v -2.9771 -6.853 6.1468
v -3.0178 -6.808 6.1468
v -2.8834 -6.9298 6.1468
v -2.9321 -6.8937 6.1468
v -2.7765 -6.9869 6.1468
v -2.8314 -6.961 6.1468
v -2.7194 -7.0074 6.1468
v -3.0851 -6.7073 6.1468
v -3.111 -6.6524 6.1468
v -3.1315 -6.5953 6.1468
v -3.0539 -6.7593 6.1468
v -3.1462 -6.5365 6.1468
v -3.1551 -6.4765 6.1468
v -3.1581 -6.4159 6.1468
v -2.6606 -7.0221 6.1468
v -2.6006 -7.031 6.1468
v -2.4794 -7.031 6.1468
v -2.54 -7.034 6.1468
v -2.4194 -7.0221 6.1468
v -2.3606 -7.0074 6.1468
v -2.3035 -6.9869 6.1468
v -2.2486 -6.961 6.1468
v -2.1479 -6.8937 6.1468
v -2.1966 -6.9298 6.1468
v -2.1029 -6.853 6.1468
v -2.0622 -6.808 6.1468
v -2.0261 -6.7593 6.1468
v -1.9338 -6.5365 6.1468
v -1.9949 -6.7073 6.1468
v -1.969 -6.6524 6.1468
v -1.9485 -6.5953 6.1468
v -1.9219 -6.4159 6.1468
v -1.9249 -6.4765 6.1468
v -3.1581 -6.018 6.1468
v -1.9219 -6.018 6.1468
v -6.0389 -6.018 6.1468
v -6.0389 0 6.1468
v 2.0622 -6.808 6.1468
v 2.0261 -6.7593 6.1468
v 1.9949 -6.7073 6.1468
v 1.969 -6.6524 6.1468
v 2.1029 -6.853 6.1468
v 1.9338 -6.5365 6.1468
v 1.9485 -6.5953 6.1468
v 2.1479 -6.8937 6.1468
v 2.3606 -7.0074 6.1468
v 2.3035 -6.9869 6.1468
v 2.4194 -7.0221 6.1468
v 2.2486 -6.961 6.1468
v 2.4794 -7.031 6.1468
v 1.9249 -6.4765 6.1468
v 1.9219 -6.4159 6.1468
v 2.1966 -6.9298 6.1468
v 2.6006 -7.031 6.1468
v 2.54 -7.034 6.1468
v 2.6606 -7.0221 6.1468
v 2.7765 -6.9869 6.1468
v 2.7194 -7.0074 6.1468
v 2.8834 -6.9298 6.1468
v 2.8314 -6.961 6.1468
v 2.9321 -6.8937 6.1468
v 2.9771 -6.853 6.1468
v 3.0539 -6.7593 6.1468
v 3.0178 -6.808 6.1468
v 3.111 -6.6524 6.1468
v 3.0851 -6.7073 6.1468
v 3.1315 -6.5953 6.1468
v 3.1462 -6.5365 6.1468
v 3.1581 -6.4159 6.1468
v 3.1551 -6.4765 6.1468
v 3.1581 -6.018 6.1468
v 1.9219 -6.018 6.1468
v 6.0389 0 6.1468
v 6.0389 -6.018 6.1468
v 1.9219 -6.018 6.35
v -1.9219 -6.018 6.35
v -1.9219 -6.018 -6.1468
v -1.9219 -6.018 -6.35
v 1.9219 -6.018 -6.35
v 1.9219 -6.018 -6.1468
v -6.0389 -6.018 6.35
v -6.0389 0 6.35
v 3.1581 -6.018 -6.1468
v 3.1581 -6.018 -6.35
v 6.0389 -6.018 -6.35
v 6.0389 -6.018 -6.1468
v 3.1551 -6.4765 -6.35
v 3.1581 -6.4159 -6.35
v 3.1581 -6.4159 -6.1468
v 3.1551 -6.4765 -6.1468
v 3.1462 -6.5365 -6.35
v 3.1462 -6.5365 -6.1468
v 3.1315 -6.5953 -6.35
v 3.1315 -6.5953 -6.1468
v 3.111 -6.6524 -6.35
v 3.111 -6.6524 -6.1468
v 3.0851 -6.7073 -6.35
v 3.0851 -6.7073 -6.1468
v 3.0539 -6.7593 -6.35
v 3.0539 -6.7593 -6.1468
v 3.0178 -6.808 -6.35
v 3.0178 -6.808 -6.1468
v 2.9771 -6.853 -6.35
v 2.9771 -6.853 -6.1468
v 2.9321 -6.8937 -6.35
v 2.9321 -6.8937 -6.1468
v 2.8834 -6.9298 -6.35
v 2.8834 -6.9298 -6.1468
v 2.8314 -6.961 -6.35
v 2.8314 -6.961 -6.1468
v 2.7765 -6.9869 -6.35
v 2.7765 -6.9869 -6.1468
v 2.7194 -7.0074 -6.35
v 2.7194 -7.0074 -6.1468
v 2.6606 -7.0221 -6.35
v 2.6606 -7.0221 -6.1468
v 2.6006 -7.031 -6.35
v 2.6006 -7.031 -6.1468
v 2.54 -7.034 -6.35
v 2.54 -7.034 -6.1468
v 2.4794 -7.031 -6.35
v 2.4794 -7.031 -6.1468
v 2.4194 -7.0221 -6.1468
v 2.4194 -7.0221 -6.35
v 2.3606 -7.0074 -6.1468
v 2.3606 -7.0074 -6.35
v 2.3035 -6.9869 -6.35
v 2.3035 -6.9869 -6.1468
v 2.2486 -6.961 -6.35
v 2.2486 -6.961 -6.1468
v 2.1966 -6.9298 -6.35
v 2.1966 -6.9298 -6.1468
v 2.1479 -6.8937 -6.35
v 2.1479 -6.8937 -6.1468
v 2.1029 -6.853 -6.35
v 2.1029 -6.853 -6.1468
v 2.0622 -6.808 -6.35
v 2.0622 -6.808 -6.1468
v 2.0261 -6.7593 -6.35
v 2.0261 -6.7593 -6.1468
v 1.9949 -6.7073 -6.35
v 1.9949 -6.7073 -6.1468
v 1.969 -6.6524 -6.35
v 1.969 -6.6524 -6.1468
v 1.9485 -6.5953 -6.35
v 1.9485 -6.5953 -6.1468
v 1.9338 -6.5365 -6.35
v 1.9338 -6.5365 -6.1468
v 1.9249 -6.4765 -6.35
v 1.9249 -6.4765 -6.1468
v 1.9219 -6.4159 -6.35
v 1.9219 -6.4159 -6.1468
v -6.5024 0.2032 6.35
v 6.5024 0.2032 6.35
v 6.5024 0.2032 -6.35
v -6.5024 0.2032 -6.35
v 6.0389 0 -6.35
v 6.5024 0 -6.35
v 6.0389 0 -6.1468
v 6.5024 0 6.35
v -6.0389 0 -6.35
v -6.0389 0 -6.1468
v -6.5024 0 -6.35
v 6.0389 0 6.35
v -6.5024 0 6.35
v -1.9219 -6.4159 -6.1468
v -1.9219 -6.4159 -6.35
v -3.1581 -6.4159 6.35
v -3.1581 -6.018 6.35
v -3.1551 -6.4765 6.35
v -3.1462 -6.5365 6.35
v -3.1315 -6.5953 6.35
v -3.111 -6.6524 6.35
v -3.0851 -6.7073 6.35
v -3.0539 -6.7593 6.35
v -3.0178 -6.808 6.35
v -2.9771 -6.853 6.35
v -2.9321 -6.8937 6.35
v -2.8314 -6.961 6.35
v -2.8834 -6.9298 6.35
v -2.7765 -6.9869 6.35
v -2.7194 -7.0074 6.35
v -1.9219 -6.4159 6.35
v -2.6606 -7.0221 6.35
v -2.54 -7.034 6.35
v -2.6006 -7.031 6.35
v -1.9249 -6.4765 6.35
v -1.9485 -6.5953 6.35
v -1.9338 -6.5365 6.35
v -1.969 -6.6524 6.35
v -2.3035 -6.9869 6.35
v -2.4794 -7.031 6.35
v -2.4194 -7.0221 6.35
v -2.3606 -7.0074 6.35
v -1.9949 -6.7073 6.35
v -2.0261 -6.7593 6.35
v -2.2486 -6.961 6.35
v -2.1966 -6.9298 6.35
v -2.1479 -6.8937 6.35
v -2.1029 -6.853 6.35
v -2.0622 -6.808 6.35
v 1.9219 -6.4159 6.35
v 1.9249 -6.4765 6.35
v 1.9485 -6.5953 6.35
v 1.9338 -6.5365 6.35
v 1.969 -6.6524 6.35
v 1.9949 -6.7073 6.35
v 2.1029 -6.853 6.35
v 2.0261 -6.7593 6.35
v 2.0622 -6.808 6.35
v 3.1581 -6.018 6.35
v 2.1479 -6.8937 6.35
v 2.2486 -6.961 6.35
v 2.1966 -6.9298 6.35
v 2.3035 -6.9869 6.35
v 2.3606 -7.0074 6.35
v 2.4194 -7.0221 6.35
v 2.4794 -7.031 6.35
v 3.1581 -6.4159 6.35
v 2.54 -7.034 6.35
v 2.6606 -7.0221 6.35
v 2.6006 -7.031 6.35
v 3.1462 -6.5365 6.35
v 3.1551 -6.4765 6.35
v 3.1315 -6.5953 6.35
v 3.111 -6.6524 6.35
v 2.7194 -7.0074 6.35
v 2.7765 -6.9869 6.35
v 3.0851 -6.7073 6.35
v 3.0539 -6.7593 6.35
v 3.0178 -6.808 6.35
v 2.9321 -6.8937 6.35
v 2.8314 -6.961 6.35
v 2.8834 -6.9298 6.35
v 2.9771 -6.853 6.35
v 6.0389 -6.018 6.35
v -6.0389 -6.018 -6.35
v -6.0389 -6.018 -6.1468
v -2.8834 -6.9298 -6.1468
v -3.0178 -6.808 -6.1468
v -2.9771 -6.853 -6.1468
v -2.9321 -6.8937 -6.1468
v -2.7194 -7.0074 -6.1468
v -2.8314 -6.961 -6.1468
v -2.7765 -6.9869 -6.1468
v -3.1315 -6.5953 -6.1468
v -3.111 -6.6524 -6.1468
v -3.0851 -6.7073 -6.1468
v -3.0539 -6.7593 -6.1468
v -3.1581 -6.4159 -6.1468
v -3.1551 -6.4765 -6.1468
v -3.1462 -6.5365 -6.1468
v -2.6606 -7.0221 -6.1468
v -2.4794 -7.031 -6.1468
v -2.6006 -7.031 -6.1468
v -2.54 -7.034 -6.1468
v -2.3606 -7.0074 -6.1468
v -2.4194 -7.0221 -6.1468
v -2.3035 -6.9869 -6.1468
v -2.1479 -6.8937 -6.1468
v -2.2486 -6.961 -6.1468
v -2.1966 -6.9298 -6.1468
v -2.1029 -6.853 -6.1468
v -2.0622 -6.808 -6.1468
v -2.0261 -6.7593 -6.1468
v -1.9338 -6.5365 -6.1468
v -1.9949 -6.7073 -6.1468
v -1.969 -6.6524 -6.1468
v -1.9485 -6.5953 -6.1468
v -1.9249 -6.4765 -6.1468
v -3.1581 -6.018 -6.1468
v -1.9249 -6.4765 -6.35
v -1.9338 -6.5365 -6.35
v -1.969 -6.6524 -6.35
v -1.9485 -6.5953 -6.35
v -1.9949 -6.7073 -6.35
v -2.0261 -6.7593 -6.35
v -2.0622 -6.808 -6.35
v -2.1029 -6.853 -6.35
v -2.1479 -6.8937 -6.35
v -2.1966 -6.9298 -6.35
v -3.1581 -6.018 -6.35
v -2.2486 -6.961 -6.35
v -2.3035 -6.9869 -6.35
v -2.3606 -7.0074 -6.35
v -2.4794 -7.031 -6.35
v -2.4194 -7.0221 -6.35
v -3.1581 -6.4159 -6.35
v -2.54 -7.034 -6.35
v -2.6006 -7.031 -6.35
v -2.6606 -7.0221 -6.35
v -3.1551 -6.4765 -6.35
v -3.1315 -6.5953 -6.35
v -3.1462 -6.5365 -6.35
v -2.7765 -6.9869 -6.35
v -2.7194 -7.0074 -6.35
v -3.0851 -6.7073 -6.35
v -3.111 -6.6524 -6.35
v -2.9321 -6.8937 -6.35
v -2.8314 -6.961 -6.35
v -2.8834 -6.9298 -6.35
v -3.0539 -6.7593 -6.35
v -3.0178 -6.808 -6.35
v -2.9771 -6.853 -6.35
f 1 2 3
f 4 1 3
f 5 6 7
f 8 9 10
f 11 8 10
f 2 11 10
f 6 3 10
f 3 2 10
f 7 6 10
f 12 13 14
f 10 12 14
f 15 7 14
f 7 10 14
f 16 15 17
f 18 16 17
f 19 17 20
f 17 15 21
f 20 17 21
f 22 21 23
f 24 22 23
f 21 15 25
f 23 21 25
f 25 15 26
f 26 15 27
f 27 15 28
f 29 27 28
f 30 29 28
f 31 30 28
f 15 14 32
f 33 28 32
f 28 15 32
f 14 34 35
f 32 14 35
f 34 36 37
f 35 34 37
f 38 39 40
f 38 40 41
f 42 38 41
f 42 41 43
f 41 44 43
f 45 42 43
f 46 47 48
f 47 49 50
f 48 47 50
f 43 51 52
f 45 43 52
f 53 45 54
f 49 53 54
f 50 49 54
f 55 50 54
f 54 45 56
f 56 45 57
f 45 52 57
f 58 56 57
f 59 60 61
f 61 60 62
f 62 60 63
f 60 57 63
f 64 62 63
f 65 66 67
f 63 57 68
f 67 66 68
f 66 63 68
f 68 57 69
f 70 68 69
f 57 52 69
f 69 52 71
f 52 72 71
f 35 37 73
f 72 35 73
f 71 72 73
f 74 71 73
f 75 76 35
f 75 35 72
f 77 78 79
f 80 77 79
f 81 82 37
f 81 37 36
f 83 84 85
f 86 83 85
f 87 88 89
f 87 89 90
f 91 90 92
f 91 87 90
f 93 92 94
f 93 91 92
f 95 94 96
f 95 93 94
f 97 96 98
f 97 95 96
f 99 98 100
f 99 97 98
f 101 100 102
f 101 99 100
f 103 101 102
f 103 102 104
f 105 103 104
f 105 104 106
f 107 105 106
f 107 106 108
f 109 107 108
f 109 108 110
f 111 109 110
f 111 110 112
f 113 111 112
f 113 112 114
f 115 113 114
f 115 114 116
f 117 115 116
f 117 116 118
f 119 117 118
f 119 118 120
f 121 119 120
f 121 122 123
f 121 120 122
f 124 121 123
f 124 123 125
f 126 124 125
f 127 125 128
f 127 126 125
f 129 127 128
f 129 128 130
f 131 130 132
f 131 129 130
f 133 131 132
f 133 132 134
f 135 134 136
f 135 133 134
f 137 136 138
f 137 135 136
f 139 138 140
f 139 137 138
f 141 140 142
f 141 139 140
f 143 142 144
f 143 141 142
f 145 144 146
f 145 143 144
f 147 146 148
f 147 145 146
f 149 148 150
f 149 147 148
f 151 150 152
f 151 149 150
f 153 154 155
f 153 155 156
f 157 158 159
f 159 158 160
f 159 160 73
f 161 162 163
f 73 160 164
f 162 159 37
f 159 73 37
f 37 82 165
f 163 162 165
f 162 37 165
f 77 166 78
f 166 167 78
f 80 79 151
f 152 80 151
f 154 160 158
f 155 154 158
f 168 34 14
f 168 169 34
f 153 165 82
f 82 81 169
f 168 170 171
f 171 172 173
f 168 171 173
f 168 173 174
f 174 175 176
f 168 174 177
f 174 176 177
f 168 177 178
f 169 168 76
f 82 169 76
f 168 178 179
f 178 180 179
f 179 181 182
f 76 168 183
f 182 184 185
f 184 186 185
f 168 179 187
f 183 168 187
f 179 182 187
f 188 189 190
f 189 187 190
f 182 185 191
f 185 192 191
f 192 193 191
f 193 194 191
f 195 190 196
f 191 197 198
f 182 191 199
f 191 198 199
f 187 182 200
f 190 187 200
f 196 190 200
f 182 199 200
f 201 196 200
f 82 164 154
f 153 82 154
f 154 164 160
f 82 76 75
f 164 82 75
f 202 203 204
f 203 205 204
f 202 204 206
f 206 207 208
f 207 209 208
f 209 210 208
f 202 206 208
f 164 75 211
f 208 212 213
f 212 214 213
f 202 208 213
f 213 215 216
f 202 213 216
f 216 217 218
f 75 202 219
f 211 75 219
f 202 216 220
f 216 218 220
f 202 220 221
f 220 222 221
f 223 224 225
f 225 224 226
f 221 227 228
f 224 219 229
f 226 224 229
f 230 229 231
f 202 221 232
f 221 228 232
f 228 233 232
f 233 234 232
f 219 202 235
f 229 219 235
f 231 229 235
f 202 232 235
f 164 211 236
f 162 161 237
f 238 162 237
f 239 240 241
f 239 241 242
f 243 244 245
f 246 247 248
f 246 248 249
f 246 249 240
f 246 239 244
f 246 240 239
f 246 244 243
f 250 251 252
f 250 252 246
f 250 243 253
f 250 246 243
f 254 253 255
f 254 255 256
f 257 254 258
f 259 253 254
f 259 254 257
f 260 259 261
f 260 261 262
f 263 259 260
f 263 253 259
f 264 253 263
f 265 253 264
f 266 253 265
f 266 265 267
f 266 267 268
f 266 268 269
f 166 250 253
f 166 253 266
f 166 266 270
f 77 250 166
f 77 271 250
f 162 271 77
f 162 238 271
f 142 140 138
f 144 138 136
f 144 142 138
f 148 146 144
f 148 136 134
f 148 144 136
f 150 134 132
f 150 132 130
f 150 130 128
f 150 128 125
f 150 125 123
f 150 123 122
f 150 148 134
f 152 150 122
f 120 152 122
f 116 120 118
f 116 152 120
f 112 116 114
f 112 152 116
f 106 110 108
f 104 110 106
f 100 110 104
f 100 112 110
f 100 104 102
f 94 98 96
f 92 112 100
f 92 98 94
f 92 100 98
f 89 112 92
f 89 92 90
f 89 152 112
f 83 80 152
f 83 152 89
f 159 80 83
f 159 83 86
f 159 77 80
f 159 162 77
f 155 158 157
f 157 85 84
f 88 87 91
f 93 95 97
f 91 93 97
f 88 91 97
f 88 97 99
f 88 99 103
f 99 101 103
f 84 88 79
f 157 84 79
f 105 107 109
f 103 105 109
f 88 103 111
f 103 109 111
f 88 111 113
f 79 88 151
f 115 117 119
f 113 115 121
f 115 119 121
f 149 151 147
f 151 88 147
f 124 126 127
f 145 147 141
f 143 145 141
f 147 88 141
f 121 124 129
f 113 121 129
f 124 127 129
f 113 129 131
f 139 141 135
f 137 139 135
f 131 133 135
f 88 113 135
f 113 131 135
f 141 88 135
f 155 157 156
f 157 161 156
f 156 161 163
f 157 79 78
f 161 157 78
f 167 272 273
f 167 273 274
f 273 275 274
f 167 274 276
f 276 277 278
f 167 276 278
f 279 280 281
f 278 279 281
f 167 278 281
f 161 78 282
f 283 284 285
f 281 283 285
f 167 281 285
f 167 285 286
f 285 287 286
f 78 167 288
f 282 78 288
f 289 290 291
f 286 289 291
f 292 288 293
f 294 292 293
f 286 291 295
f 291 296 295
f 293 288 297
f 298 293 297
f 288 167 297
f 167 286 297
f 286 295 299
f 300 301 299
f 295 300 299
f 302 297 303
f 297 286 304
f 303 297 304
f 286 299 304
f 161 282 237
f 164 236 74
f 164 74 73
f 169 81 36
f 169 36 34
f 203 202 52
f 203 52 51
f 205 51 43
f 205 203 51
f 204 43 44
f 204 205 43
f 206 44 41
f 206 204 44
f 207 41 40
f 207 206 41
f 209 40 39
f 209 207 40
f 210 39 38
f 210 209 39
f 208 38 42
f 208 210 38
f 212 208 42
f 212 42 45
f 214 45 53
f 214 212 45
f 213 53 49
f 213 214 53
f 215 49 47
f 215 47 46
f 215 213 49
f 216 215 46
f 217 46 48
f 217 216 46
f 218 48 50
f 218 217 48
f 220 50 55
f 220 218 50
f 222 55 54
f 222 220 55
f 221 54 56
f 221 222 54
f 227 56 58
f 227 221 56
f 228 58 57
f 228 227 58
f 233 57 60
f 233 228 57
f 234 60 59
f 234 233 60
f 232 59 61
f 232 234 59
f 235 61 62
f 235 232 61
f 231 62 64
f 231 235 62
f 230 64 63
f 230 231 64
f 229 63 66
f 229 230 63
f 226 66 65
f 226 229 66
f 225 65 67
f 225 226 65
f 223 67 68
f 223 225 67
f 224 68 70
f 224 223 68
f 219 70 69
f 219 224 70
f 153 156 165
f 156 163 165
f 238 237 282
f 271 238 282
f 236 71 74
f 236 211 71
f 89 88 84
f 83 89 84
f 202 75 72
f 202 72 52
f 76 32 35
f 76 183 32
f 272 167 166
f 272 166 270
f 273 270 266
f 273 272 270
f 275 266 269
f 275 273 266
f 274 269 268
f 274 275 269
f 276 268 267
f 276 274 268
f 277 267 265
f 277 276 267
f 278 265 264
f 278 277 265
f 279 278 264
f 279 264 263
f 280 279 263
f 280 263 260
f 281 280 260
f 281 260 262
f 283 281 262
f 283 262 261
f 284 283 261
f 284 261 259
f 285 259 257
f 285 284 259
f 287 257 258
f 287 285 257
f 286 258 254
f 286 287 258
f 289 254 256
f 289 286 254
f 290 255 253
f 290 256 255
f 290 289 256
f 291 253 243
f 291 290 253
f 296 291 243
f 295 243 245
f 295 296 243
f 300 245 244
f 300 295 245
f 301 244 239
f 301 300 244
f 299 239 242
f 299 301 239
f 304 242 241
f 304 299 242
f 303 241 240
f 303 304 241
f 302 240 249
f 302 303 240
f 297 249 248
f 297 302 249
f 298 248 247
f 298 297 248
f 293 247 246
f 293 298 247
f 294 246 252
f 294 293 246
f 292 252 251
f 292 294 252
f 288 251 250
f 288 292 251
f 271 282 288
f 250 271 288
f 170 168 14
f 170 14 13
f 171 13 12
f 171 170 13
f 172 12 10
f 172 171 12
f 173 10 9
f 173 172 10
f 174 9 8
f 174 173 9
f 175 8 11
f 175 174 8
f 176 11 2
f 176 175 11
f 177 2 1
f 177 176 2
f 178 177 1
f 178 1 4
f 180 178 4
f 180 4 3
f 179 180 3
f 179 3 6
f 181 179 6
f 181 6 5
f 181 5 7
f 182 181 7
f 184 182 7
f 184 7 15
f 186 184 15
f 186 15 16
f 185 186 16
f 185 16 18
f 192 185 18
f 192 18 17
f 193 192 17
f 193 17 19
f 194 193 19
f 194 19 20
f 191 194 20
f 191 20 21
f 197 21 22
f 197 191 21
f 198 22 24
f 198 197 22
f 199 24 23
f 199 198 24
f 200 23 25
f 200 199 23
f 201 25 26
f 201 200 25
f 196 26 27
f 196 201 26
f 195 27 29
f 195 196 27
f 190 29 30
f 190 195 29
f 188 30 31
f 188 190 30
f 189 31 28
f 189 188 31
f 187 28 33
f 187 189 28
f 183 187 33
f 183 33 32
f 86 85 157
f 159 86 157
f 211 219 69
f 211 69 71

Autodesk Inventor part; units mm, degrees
sketch "Sketch_1" plane through (0, 0, 0) normal (0, 1, 0) x (-1, 0, 0)
  line L0 (6.5024, 6.35) -> (-6.5024, 6.35)
  line L1 (-6.5024, 6.35) -> (-6.5024, -6.35)
  line L2 (-6.5024, -6.35) -> (6.5024, -6.35)
  line L3 (6.5024, -6.35) -> (6.5024, 6.35)
extrude "Extrusion1" add sketch "Sketch_1" along normal blind 0.2032
sketch "Sketch_2" plane through (0, 0, -6.35) normal (0, 0, 1) x (1, 0, 0)
  line L0 (-6.0389, -6.018) -> (-3.1581, -6.018)
  line L1 (-3.1581, -6.018) -> (-3.1581, -6.4159)
  arc A0 (-3.1581, -6.4159) -> (-1.9219, -6.4159) centre (-2.54, -6.4159) ccw
  line L2 (-1.9219, -6.4159) -> (-1.9219, -6.018)
  line L3 (-1.9219, -6.018) -> (1.9219, -6.018)
  line L4 (1.9219, -6.018) -> (1.9219, -6.4159)
  arc A1 (1.9219, -6.4159) -> (3.1581, -6.4159) centre (2.54, -6.4159) ccw
  line L5 (3.1581, -6.4159) -> (3.1581, -6.018)
  line L6 (3.1581, -6.018) -> (6.0389, -6.018)
  line L7 (6.0389, -6.018) -> (6.0389, 0)
  line L8 (6.0389, 0) -> (-6.0389, 0)
  line L9 (-6.0389, 0) -> (-6.0389, -6.018)
extrude "Extrusion2" add sketch "Sketch_2" along normal blind 0.2032
sketch "Sketch_3" plane through (0, 0, 6.35) normal (0, 0, 1) x (1, 0, 0)
  line L0 (-6.0389, -6.018) -> (-3.1581, -6.018)
  line L1 (-3.1581, -6.018) -> (-3.1581, -6.4159)
  arc A0 (-3.1581, -6.4159) -> (-1.9219, -6.4159) centre (-2.54, -6.4159) ccw
  line L2 (-1.9219, -6.4159) -> (-1.9219, -6.018)
  line L3 (-1.9219, -6.018) -> (1.9219, -6.018)
  line L4 (1.9219, -6.018) -> (1.9219, -6.4159)
  arc A1 (1.9219, -6.4159) -> (3.1581, -6.4159) centre (2.54, -6.4159) ccw
  line L5 (3.1581, -6.4159) -> (3.1581, -6.018)
  line L6 (3.1581, -6.018) -> (6.0389, -6.018)
  line L7 (6.0389, -6.018) -> (6.0389, 0)
  line L8 (6.0389, 0) -> (-6.0389, 0)
  line L9 (-6.0389, 0) -> (-6.0389, -6.018)
extrude "Extrusion3" add sketch "Sketch_3" against normal blind 0.2032
ref_plane "shroud_to_body_XY" through (0, 0, 0) normal (0, 1, 0) x (1, 0, 0)
ref_plane "shroud_to_body_YZ" through (0, 0, 0) normal (1, 0, 0) x (0, 0, -1)
ref_plane "shroud_to_body_ZX" through (0, 0, 0) normal (0, 0, -1) x (0, 1, 0)
properties part number "M20_ang_t_shorud2830TX-switch"
